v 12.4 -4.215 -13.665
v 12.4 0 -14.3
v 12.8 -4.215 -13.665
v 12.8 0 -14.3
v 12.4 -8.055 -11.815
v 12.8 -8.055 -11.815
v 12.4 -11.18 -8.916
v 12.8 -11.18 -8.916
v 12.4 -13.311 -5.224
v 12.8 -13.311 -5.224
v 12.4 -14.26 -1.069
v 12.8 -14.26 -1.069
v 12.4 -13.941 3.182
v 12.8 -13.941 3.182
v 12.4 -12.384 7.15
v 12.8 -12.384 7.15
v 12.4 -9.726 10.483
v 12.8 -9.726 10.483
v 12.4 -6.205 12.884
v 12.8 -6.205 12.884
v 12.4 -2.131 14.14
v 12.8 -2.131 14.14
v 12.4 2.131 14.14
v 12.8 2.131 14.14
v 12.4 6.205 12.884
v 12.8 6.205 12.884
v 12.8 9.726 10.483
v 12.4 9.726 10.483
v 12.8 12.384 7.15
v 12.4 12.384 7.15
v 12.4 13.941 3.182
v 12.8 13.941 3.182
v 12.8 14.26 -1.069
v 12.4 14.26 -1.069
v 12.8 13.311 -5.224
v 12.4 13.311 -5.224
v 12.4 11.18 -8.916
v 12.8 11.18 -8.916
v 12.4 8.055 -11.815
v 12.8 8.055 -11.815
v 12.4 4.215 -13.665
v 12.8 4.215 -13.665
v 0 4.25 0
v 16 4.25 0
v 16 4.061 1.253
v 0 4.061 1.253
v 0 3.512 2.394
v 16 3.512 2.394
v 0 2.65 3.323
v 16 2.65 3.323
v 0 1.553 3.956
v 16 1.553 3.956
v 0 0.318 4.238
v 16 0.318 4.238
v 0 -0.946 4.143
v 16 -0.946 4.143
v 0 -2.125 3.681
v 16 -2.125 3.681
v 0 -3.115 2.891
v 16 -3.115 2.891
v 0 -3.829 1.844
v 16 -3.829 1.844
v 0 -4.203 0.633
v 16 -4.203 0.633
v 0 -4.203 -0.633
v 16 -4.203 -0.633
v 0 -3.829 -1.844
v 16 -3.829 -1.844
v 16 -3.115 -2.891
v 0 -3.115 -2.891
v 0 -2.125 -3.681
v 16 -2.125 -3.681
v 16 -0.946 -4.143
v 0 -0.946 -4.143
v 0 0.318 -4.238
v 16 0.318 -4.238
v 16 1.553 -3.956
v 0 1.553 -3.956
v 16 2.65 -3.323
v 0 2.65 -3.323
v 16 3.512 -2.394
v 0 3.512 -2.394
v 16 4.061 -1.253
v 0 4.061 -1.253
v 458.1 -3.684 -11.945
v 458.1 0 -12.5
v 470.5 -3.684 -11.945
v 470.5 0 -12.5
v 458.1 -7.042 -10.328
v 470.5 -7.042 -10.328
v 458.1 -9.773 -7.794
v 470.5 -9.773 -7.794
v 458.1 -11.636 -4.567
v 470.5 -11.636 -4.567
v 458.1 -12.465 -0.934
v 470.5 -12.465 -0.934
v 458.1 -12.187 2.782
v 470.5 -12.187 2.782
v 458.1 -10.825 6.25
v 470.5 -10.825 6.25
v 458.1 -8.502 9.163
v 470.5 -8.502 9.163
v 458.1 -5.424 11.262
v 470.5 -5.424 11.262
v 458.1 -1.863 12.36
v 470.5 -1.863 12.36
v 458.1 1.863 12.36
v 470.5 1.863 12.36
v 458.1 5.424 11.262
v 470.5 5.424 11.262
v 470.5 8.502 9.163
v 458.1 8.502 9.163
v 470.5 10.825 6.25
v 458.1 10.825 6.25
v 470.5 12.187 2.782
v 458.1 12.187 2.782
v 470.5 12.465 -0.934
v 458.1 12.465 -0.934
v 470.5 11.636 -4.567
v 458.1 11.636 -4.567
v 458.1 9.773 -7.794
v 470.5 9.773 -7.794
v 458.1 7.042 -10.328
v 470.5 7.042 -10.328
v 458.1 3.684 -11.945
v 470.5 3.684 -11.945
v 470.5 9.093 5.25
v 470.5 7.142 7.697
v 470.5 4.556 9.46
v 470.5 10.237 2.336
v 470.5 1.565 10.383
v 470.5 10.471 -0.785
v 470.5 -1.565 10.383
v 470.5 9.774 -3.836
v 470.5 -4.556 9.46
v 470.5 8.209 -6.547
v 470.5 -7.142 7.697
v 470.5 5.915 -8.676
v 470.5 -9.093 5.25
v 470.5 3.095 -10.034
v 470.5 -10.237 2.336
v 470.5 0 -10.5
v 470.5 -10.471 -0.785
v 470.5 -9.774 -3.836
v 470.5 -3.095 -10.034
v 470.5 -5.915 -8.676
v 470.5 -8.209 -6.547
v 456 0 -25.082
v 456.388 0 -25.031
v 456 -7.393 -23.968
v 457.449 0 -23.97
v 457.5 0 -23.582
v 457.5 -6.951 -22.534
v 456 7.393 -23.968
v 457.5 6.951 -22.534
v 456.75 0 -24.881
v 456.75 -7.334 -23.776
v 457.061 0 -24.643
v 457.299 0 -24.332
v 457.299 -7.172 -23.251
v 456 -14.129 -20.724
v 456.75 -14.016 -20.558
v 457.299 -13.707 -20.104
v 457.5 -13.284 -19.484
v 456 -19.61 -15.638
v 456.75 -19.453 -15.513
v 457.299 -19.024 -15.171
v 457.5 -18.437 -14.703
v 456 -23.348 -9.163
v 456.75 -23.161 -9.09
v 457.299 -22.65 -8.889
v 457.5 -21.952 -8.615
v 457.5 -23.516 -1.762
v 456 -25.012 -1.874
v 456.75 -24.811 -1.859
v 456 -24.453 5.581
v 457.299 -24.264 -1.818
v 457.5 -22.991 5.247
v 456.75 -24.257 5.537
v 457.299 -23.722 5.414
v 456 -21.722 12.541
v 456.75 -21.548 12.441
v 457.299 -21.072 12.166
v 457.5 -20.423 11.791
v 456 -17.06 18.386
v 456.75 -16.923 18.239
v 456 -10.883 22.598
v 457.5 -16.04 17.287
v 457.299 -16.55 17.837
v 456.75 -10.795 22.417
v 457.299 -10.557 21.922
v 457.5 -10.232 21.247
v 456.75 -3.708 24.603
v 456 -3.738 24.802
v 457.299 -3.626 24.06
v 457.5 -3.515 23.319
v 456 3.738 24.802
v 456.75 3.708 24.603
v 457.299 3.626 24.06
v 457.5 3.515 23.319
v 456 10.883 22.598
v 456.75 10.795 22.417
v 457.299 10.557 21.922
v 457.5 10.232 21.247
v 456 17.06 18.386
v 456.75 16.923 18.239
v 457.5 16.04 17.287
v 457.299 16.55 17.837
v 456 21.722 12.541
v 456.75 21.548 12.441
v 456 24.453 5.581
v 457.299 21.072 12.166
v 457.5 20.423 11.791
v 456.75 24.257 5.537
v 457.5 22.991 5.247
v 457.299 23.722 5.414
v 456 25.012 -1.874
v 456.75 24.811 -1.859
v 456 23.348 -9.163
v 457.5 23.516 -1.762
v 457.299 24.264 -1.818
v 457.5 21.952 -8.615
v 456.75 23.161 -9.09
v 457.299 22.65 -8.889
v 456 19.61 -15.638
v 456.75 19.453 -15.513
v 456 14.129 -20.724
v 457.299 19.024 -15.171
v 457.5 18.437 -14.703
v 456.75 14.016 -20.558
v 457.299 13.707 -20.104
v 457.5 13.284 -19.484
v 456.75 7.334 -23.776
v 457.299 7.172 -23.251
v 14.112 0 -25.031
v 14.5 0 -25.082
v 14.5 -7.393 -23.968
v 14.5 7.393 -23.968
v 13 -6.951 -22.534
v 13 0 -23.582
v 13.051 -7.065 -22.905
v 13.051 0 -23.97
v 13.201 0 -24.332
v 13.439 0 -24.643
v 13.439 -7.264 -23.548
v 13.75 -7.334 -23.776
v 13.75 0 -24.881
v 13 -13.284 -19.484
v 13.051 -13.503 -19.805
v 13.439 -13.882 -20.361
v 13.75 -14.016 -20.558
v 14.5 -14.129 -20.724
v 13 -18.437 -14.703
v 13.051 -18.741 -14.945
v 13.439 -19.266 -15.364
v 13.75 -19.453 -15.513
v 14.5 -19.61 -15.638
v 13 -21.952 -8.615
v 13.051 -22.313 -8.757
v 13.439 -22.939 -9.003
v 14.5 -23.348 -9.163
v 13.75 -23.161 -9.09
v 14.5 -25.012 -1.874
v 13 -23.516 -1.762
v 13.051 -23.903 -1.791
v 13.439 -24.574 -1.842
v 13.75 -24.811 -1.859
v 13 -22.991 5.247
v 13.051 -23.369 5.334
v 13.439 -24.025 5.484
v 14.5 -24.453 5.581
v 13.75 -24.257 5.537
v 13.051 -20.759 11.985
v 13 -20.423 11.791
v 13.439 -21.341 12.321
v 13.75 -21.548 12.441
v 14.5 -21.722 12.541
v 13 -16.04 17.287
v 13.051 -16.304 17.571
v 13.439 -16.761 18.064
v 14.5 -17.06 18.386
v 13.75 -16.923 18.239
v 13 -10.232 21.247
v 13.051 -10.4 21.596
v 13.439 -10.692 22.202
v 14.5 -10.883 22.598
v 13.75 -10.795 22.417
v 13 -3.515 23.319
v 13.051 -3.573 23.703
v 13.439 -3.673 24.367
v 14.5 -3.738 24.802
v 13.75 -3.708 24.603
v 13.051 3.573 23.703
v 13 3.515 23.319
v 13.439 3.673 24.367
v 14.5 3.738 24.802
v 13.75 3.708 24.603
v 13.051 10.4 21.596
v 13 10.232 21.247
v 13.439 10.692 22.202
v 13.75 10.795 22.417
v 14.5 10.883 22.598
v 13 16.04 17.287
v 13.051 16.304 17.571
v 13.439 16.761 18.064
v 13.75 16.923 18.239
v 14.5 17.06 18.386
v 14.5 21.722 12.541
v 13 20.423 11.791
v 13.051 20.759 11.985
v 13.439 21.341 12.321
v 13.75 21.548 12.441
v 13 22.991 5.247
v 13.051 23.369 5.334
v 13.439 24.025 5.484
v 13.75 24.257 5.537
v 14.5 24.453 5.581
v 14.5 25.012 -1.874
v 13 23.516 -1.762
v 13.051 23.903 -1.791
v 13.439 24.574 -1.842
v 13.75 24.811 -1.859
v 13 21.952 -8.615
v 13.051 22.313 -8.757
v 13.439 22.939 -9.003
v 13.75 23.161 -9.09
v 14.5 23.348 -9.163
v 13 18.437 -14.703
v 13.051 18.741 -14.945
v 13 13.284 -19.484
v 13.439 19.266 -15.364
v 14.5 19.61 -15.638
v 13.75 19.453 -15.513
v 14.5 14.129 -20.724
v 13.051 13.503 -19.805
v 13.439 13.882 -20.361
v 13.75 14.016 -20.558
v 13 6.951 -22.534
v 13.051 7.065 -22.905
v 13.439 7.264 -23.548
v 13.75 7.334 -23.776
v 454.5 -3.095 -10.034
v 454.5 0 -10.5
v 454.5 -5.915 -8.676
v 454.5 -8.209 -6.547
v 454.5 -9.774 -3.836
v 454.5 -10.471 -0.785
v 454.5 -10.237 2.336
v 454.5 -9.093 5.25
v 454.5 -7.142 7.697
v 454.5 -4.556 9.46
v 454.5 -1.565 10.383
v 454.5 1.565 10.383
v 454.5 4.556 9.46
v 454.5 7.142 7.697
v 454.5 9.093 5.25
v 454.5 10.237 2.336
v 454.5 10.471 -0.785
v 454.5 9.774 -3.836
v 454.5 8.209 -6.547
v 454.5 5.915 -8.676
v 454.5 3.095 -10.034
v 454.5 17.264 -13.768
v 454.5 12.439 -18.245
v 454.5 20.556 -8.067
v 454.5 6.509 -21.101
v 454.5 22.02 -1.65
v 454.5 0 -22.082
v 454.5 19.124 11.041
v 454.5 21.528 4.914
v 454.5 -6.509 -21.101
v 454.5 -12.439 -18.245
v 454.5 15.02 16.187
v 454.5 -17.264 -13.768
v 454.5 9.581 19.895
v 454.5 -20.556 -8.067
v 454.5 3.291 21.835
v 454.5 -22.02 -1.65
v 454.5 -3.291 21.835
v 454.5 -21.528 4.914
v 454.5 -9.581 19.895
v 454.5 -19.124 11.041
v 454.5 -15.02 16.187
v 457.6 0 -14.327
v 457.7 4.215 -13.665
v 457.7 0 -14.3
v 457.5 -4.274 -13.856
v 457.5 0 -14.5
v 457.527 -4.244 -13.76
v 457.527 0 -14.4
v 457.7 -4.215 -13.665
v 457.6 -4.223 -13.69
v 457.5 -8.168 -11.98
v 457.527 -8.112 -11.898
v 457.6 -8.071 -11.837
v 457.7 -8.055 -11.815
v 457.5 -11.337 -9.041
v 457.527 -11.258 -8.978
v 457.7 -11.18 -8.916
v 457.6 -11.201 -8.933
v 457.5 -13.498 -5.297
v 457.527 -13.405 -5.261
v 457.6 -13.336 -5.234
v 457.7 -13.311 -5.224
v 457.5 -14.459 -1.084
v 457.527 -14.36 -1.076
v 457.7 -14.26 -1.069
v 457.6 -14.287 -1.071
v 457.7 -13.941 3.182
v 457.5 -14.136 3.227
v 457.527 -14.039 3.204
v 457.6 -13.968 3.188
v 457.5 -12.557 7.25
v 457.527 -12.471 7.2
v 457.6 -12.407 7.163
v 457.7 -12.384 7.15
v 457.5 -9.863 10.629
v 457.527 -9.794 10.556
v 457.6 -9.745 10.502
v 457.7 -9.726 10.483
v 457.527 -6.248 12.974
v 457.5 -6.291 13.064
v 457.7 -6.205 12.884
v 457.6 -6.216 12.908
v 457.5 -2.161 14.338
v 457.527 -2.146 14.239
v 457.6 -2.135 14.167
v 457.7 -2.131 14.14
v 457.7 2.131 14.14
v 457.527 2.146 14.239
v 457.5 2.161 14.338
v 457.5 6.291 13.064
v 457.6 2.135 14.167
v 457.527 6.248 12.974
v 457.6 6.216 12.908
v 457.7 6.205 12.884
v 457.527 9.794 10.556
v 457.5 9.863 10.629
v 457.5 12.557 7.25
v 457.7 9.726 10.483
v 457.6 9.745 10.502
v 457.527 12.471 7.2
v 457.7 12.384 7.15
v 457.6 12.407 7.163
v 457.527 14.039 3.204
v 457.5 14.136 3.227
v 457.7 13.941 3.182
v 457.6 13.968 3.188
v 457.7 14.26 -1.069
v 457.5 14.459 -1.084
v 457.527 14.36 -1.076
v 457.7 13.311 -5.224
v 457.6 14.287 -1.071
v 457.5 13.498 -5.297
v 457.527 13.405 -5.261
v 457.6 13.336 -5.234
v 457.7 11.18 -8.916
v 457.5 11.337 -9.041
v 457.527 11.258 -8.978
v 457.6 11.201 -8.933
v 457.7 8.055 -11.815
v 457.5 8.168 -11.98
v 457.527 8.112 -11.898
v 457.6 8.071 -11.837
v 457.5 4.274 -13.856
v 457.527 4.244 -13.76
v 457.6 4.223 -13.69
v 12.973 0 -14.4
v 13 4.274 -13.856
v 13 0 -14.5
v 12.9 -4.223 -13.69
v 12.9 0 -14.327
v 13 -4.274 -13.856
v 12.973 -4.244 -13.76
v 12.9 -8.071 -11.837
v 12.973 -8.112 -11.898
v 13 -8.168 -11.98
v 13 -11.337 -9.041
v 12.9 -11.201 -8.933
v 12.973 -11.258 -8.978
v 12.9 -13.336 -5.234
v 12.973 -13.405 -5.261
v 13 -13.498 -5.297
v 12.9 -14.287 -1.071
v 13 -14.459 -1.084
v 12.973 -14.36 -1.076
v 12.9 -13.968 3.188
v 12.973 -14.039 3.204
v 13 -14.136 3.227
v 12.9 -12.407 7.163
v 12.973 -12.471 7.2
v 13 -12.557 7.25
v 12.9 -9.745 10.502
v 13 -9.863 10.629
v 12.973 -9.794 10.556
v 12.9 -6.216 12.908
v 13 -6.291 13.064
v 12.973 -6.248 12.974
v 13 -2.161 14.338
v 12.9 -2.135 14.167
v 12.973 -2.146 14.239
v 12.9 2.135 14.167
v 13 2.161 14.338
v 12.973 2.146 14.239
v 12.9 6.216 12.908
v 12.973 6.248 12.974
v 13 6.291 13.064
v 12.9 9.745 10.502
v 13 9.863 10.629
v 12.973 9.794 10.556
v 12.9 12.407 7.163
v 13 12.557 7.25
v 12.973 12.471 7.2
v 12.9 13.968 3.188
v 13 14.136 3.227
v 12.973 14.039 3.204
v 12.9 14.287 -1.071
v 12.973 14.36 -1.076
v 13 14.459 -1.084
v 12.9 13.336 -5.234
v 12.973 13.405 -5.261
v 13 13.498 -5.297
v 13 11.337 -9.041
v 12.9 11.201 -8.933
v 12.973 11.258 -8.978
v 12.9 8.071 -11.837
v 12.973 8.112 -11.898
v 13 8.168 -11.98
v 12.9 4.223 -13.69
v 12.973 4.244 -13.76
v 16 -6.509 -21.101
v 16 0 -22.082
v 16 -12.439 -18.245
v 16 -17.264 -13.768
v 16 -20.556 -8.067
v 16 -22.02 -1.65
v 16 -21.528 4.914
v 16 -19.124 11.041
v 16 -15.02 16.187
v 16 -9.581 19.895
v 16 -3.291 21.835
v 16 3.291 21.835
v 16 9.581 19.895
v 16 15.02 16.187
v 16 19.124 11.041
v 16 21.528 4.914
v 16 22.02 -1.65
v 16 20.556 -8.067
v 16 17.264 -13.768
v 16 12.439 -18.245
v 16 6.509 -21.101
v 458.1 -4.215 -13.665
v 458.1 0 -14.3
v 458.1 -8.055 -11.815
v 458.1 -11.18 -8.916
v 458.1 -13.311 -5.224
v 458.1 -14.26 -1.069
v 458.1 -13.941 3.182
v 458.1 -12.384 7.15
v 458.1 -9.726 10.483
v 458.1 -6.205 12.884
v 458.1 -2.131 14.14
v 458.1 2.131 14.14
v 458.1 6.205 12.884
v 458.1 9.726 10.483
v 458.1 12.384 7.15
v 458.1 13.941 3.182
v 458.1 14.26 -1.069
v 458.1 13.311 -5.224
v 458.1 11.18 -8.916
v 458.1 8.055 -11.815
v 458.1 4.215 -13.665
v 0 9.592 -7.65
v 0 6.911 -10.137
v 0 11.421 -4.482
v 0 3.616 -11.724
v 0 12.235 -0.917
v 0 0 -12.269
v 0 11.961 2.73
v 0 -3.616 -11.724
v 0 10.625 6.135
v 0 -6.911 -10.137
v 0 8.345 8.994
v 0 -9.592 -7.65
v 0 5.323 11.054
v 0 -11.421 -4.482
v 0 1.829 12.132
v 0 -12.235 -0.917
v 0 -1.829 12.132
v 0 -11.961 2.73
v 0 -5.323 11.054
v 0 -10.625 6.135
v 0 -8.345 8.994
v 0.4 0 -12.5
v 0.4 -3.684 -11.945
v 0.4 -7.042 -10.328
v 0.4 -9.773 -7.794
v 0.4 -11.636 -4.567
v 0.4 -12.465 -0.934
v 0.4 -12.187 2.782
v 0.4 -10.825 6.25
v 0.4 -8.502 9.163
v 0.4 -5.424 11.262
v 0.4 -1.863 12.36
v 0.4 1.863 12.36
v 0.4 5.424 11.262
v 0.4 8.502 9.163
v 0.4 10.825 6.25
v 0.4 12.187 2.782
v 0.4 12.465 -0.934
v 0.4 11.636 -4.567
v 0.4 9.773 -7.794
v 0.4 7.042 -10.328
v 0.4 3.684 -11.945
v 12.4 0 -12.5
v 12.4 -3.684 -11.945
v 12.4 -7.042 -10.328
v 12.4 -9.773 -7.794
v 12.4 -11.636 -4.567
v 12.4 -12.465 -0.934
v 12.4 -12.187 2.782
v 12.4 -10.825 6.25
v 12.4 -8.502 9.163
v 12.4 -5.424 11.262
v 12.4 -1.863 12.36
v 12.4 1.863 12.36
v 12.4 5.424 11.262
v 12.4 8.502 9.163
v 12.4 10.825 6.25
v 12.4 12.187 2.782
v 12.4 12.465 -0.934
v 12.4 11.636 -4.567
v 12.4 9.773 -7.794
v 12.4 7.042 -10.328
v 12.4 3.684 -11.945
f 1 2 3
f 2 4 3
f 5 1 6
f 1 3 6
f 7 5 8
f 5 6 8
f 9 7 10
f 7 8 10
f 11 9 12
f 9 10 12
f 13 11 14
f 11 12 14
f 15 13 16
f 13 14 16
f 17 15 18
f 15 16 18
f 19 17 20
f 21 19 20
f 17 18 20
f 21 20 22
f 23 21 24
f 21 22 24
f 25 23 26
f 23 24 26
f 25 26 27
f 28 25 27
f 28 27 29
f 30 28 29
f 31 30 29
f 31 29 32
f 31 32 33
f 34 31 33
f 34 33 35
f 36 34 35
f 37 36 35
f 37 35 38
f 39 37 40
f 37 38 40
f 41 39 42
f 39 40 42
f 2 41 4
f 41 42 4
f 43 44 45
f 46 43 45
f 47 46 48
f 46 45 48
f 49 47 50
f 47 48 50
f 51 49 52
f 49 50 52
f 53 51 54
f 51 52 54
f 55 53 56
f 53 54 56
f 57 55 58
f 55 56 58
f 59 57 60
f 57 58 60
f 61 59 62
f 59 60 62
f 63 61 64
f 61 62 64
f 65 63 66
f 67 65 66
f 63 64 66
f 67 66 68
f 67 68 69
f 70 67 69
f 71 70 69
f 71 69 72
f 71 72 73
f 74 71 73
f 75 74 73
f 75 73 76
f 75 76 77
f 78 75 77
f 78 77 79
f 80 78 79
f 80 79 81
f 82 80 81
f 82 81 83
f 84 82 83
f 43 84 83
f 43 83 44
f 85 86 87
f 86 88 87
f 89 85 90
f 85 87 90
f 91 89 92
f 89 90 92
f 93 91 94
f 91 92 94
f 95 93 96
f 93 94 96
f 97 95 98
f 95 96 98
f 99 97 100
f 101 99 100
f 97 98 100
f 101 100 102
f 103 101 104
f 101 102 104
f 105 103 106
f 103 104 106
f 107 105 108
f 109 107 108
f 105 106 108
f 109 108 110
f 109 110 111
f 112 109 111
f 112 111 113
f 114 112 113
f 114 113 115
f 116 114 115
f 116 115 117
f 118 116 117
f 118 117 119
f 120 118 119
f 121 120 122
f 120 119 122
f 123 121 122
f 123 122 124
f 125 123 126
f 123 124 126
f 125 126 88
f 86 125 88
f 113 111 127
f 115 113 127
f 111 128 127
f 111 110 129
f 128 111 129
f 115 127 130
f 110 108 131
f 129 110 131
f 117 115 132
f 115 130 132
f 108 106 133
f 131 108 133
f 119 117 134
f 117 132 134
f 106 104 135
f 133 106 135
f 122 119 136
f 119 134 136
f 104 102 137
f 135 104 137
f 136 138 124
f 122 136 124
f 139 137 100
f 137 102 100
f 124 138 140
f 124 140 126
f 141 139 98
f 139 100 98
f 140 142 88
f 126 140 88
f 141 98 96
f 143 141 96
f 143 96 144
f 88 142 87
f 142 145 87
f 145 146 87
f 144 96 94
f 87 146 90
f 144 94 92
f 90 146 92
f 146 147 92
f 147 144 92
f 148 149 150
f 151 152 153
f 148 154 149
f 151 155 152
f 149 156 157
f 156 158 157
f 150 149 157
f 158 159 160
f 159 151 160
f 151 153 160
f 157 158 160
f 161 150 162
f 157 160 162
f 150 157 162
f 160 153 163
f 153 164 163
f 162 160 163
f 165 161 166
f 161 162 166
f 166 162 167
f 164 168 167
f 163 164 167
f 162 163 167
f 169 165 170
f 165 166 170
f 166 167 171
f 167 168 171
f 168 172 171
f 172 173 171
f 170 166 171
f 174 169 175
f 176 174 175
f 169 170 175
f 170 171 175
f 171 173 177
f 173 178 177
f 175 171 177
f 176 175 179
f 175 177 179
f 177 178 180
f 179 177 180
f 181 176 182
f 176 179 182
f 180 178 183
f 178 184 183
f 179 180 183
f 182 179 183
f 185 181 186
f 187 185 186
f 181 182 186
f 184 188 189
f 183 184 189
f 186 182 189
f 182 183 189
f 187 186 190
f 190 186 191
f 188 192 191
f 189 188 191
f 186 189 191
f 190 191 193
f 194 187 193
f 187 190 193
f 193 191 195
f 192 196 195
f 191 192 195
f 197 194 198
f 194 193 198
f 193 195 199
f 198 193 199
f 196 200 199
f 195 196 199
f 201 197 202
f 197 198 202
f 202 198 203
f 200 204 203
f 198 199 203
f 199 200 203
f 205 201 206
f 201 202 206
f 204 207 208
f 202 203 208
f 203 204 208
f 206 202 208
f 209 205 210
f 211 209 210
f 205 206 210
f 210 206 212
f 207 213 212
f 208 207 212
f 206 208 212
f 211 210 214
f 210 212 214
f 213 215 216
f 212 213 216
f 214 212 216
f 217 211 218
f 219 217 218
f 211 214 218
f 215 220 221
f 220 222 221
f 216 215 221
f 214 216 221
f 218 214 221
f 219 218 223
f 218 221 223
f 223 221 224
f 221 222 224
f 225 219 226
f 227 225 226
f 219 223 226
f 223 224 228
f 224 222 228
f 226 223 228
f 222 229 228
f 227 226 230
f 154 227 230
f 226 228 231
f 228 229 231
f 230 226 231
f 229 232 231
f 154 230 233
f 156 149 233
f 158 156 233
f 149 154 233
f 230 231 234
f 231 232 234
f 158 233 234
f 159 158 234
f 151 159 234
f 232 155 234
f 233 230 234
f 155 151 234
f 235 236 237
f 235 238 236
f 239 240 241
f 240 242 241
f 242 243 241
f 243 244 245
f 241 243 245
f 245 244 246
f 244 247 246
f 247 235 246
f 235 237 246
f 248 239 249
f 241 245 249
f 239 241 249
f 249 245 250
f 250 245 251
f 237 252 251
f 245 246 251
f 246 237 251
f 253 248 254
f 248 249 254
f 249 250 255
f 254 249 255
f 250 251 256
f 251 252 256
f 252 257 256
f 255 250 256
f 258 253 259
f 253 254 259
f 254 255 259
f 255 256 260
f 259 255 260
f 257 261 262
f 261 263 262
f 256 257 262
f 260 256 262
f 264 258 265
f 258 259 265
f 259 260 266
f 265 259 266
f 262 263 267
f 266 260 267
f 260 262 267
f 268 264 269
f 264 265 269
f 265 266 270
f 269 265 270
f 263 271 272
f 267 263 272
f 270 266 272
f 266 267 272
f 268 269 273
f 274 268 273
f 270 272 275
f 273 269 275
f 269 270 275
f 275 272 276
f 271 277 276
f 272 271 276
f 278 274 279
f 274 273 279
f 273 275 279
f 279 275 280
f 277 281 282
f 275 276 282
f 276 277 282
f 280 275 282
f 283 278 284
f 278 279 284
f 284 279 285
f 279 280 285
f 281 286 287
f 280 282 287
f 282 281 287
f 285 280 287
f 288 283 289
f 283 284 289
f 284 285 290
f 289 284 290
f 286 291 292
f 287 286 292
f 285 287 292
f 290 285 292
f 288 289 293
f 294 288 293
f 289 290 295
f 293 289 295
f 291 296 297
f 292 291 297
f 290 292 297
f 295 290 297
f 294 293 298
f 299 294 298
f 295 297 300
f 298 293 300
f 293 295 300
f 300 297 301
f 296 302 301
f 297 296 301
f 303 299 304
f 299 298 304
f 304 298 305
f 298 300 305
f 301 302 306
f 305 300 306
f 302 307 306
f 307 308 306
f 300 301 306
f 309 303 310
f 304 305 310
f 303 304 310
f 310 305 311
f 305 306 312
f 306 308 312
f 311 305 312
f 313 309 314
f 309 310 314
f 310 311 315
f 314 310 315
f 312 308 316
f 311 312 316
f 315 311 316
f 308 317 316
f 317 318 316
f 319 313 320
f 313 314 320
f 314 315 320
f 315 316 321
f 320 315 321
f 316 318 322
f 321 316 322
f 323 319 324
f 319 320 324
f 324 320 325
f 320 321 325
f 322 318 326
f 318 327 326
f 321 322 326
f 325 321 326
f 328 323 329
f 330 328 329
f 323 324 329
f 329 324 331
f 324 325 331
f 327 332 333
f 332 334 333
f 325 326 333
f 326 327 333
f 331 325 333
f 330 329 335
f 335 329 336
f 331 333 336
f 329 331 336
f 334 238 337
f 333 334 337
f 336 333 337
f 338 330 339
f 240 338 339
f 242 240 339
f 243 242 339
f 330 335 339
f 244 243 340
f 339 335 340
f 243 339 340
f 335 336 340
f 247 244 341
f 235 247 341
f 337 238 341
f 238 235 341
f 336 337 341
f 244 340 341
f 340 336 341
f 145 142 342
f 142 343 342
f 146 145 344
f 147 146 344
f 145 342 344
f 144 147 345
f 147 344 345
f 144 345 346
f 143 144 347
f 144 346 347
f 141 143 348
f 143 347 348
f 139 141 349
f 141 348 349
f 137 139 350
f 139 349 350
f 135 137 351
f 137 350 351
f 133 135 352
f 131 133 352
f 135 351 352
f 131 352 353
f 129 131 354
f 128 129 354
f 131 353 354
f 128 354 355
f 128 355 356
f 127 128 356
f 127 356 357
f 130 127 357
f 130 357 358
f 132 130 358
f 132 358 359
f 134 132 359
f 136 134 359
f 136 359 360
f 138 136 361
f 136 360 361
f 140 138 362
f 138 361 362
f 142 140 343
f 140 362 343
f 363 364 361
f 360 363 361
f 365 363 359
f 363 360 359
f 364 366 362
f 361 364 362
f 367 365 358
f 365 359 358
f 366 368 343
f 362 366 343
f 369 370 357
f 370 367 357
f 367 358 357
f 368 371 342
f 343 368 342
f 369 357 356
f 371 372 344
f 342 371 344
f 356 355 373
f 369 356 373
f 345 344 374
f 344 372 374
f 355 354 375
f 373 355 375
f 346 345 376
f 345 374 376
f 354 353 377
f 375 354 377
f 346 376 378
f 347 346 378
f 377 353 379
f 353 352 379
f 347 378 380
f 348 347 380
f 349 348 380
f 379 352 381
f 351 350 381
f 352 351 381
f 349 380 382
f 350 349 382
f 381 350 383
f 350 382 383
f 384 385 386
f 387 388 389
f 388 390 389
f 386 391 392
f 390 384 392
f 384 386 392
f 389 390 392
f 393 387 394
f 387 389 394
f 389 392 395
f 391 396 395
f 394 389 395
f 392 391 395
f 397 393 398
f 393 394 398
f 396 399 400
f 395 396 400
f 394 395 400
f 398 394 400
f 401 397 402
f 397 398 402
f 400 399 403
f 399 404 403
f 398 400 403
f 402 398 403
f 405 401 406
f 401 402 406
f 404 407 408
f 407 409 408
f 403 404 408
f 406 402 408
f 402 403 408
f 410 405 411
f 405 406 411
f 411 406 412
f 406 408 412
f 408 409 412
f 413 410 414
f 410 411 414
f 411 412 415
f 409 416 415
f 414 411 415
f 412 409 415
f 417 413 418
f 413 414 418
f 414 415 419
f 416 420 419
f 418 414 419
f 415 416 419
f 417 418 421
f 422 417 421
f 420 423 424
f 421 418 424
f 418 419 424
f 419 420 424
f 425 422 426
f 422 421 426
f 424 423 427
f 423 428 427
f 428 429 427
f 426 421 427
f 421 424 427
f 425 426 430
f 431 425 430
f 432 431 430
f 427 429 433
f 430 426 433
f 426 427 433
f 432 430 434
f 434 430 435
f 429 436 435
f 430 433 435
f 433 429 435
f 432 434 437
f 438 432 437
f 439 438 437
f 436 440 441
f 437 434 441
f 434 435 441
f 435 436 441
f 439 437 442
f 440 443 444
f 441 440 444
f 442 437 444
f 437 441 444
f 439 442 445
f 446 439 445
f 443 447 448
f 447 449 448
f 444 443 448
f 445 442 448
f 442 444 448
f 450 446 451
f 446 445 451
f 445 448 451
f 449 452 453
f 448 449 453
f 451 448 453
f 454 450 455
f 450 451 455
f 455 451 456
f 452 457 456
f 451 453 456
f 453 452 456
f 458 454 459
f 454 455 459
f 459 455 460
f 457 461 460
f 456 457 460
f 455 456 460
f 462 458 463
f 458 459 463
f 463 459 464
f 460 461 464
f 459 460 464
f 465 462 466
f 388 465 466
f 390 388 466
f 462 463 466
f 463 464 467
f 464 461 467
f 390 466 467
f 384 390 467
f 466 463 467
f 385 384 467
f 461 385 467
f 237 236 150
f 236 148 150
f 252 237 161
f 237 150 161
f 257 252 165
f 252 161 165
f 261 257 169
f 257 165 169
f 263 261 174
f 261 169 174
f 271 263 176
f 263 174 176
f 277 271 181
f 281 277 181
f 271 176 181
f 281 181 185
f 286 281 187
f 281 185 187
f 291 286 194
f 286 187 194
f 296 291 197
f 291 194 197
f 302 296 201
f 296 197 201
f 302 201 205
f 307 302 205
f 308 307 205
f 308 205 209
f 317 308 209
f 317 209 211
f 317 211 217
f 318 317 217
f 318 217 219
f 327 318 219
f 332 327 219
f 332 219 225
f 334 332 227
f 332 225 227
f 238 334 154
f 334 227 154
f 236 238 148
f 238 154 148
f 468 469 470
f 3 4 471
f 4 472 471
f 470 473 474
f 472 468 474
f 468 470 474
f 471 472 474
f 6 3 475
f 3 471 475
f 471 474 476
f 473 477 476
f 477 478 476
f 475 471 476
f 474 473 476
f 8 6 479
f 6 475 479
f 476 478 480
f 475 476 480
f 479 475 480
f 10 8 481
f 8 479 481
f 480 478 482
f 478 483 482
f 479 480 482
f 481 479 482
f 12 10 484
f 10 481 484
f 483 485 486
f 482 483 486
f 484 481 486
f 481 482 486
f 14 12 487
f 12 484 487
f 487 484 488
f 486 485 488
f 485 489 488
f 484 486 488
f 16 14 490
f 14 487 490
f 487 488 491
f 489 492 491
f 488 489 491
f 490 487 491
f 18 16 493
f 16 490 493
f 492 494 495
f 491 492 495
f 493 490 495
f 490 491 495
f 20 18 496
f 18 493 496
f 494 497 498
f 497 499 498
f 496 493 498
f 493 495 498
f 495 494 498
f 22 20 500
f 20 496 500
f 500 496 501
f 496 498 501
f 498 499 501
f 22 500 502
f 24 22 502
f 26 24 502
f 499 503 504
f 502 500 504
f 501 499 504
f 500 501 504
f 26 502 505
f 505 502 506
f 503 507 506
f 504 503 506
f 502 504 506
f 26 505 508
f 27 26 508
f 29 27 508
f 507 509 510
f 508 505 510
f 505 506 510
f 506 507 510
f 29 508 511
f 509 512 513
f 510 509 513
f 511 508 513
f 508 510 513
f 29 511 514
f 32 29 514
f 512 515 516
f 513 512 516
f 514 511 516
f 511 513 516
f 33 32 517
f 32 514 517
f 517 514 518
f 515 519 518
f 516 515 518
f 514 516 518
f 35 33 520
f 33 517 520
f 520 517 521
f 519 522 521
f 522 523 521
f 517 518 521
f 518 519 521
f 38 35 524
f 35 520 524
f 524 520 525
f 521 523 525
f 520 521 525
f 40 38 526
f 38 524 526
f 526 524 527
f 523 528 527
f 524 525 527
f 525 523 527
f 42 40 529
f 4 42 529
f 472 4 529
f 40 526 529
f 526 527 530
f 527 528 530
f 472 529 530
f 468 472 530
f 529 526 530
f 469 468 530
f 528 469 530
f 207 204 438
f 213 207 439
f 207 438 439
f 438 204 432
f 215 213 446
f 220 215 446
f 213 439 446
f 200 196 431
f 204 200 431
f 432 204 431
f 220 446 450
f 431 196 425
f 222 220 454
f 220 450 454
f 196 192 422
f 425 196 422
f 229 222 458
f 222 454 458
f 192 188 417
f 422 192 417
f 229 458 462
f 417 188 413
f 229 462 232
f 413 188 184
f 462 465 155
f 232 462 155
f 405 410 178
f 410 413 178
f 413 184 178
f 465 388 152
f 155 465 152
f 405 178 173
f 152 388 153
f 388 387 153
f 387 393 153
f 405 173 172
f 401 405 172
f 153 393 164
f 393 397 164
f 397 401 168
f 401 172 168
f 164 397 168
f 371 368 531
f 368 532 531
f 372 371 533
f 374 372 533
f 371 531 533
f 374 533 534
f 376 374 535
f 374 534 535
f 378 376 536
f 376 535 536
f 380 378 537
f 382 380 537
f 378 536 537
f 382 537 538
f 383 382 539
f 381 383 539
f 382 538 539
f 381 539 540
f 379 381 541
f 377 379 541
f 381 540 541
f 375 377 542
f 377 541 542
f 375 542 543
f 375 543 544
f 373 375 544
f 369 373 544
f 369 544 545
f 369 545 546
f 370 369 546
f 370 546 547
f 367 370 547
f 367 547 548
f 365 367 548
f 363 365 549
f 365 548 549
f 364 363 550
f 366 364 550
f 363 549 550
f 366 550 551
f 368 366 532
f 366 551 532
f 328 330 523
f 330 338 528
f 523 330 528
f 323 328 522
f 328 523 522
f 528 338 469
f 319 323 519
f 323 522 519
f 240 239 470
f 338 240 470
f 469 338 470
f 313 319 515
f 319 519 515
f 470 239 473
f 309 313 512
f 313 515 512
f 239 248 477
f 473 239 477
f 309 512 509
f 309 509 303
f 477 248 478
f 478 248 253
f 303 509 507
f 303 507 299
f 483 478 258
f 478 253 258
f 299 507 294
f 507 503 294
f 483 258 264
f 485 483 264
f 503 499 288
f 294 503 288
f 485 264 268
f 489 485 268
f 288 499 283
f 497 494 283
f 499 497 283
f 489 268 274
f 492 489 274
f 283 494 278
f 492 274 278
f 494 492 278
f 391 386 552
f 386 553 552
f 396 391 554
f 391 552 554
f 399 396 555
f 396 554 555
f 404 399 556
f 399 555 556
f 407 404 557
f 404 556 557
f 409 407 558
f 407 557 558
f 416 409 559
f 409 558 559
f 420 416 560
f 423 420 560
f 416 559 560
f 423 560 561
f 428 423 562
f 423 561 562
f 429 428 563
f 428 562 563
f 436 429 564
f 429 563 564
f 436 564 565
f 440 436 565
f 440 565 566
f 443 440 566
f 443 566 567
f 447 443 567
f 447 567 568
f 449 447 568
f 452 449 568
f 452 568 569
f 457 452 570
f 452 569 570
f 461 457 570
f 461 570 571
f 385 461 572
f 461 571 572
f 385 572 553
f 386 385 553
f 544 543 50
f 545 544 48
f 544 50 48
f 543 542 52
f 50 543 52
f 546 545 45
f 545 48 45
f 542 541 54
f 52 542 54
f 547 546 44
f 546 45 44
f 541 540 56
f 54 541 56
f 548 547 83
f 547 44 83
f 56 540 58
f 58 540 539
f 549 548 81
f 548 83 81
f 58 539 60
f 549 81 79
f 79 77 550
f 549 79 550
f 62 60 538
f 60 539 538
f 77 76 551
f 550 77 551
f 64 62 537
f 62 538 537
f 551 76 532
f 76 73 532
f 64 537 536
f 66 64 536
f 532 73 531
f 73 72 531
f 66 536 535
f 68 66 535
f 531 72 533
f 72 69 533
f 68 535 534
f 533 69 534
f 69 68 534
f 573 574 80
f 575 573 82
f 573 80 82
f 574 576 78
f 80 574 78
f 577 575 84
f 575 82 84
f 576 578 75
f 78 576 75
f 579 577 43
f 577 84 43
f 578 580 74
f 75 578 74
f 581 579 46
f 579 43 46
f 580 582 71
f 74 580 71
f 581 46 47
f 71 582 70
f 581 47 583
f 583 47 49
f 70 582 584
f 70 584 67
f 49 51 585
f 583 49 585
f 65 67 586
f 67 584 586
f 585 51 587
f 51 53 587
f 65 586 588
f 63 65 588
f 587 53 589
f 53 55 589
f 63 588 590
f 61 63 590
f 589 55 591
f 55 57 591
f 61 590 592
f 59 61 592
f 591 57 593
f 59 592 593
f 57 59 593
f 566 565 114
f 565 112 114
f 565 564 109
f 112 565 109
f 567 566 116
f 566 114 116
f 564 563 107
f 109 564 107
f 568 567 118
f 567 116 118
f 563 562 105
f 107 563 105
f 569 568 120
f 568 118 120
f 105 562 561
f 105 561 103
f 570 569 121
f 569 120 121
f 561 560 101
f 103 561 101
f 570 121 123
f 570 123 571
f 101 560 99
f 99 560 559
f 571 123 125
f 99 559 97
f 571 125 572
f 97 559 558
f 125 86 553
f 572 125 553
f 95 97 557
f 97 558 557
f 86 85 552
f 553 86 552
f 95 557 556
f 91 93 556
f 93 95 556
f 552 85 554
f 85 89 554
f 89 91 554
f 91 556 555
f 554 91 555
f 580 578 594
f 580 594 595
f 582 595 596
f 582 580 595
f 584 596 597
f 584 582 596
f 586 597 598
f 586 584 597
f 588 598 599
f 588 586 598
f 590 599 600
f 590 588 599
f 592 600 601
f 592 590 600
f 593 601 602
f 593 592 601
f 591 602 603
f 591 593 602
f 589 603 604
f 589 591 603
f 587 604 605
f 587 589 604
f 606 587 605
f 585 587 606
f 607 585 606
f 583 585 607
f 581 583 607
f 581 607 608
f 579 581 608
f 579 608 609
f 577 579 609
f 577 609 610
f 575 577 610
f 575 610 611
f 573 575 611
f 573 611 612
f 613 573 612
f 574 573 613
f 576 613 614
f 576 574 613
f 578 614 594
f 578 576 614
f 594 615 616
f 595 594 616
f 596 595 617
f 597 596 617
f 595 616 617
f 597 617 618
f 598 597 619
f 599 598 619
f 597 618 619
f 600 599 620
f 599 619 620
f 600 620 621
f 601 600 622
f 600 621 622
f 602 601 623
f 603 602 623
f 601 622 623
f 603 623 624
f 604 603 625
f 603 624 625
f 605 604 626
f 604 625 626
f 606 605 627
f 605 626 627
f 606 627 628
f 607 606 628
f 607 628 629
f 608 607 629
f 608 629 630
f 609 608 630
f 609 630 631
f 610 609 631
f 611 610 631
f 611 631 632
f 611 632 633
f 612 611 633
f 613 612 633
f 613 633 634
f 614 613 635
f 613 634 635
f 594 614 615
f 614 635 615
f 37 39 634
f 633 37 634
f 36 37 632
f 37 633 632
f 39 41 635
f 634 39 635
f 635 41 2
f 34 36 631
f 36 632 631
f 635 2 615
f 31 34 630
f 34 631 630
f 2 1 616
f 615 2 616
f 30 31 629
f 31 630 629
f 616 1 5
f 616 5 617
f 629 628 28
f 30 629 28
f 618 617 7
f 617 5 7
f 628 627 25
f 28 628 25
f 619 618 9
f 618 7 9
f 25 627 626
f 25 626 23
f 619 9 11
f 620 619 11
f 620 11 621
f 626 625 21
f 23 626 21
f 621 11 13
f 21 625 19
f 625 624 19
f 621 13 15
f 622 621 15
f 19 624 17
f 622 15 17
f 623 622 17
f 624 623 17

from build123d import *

# Parameters (mm, degrees)
F2_SIZE2 = 0.2309401077
F2_SIZE  = 0.4
F4_D     = 8.5


with BuildPart() as f1:
    # F0 (on Front) → F1 (revolve)
    with BuildSketch(Plane.XZ):
        with BuildLine():
            Line((0, 0), (0, -12.5))
            Line((0, -12.5), (12.4, -12.5))
            Line((12.4, -12.5), (12.4, -14.3))
            Line((12.4, -14.3), (12.8, -14.3))
            ThreePointArc((12.8, -14.3), (12.9414213562, -14.3585786438), (13, -14.5))
            Line((13, -14.5), (13, -23.582))
            ThreePointArc((13, -23.582), (13.4393398282, -24.6426601718), (14.5, -25.082))
            Line((14.5, -25.082), (456, -25.082))
            ThreePointArc((456, -25.082), (457.0606601718, -24.6426601718), (457.5, -23.582))
            Line((457.5, -23.582), (457.5, -14.5))
            ThreePointArc((457.5, -14.5), (457.5585786438, -14.3585786438), (457.7, -14.3))
            Line((457.7, -14.3), (458.1, -14.3))
            Line((458.1, -14.3), (458.1, -12.5))
            Line((458.1, -12.5), (470.5, -12.5))
            Line((470.5, -12.5), (470.5, -10.5))
            Line((470.5, -10.5), (454.5, -10.5))
            Line((454.5, -10.5), (454.5, -22.082))
            Line((454.5, -22.082), (16, -22.082))
            Line((16, -22.082), (16, 0))
            Line((16, 0), (0, 0))
        make_face()
    revolve(axis=Axis((8, 0, 0), (-1, 0, 0)))

    # F2
    f2_edges = [f1.edges().sort_by_distance(p)[0] for p in [
        (0, 0, 12.5),
    ]]
    f2_side = f1.faces().sort_by_distance((6.2, 0, 12.5))[0]
    chamfer(f2_edges, length=F2_SIZE, length2=F2_SIZE2, reference=f2_side)

    # F4 (through all)
    with Locations(Plane(origin=(0, 0, 0), x_dir=(0, -1, 0), z_dir=(-1, 0, 0))):
        with Locations((0, 0)):
            Hole(F4_D / 2)


solid = f1.part
